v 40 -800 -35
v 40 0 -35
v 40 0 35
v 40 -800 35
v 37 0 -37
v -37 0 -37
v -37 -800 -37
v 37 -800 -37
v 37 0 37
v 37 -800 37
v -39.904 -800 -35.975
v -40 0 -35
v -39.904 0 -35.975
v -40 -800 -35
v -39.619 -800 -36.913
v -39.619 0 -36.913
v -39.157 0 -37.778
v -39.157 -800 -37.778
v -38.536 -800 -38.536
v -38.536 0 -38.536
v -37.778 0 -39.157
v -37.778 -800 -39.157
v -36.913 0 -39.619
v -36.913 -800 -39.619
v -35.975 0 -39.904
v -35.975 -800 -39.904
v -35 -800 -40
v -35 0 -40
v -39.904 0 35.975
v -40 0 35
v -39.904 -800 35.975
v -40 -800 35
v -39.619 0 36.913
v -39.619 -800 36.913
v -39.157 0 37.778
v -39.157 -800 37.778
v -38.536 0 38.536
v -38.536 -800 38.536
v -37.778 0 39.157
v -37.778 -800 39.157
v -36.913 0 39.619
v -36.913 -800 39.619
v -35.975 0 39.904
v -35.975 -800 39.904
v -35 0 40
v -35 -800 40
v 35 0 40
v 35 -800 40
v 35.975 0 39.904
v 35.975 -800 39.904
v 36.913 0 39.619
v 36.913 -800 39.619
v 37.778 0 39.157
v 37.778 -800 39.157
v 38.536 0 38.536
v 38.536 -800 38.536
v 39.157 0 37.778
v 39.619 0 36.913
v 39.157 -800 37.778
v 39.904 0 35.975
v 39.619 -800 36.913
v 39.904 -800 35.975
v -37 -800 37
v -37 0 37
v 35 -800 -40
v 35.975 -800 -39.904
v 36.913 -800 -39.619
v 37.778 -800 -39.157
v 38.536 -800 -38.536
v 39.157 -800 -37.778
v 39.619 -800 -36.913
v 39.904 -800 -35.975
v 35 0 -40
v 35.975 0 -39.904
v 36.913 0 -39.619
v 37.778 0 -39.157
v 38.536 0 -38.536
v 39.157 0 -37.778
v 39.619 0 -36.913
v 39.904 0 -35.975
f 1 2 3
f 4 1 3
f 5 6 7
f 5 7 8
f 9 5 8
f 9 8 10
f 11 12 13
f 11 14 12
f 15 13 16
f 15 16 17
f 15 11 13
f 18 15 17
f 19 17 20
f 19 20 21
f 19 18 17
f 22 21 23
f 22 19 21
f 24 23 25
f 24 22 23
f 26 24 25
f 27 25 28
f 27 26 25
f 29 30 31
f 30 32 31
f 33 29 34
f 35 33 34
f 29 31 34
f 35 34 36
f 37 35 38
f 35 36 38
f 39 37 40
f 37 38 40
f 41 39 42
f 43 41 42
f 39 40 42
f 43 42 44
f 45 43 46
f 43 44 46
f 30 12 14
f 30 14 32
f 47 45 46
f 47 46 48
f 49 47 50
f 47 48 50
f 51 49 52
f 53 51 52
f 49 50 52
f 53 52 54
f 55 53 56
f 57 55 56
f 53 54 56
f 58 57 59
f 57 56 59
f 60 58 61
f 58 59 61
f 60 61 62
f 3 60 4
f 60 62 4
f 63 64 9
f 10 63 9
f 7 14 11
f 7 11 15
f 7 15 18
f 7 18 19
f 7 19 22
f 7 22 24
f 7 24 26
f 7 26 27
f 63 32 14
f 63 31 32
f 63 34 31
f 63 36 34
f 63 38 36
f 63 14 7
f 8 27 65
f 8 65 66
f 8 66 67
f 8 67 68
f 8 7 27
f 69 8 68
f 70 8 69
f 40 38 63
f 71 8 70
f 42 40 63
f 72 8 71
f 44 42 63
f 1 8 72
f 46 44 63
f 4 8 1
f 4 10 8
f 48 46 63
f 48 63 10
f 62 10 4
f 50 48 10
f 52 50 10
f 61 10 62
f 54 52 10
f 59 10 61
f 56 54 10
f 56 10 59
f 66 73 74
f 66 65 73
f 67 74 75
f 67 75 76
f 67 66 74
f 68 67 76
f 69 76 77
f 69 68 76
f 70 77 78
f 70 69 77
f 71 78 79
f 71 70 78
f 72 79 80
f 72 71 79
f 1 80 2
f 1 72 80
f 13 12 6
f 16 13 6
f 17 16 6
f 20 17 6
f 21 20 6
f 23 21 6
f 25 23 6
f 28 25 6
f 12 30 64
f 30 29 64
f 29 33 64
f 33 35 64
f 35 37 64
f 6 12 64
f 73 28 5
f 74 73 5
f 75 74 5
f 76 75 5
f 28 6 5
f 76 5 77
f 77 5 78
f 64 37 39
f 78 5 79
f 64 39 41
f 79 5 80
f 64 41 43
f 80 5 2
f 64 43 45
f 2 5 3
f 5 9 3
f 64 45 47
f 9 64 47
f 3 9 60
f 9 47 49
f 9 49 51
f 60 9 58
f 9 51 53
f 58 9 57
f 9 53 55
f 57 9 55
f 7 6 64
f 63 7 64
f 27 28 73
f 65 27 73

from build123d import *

# Parameters (mm, degrees)
F0_W     = 80
F0_H     = 80
F0_W_2   = 74
F0_H_2   = 74
F1_DEPTH = 800
F2_R     = 5


with BuildPart() as f1:
    # F0 (on Front) → F1 (new body)
    with BuildSketch(Plane.XZ):
        Rectangle(F0_W, F0_H)
        Rectangle(F0_W_2, F0_H_2, mode=Mode.SUBTRACT)
    extrude(amount=F1_DEPTH)

    # F2
    f2_edges = [f1.edges().sort_by_distance(p)[0] for p in [
        (40, -400, 40),
        (-40, -400, 40),
        (40, -400, -40),
        (-40, -400, -40),
    ]]
    fillet(f2_edges, radius=F2_R)


solid = f1.part
